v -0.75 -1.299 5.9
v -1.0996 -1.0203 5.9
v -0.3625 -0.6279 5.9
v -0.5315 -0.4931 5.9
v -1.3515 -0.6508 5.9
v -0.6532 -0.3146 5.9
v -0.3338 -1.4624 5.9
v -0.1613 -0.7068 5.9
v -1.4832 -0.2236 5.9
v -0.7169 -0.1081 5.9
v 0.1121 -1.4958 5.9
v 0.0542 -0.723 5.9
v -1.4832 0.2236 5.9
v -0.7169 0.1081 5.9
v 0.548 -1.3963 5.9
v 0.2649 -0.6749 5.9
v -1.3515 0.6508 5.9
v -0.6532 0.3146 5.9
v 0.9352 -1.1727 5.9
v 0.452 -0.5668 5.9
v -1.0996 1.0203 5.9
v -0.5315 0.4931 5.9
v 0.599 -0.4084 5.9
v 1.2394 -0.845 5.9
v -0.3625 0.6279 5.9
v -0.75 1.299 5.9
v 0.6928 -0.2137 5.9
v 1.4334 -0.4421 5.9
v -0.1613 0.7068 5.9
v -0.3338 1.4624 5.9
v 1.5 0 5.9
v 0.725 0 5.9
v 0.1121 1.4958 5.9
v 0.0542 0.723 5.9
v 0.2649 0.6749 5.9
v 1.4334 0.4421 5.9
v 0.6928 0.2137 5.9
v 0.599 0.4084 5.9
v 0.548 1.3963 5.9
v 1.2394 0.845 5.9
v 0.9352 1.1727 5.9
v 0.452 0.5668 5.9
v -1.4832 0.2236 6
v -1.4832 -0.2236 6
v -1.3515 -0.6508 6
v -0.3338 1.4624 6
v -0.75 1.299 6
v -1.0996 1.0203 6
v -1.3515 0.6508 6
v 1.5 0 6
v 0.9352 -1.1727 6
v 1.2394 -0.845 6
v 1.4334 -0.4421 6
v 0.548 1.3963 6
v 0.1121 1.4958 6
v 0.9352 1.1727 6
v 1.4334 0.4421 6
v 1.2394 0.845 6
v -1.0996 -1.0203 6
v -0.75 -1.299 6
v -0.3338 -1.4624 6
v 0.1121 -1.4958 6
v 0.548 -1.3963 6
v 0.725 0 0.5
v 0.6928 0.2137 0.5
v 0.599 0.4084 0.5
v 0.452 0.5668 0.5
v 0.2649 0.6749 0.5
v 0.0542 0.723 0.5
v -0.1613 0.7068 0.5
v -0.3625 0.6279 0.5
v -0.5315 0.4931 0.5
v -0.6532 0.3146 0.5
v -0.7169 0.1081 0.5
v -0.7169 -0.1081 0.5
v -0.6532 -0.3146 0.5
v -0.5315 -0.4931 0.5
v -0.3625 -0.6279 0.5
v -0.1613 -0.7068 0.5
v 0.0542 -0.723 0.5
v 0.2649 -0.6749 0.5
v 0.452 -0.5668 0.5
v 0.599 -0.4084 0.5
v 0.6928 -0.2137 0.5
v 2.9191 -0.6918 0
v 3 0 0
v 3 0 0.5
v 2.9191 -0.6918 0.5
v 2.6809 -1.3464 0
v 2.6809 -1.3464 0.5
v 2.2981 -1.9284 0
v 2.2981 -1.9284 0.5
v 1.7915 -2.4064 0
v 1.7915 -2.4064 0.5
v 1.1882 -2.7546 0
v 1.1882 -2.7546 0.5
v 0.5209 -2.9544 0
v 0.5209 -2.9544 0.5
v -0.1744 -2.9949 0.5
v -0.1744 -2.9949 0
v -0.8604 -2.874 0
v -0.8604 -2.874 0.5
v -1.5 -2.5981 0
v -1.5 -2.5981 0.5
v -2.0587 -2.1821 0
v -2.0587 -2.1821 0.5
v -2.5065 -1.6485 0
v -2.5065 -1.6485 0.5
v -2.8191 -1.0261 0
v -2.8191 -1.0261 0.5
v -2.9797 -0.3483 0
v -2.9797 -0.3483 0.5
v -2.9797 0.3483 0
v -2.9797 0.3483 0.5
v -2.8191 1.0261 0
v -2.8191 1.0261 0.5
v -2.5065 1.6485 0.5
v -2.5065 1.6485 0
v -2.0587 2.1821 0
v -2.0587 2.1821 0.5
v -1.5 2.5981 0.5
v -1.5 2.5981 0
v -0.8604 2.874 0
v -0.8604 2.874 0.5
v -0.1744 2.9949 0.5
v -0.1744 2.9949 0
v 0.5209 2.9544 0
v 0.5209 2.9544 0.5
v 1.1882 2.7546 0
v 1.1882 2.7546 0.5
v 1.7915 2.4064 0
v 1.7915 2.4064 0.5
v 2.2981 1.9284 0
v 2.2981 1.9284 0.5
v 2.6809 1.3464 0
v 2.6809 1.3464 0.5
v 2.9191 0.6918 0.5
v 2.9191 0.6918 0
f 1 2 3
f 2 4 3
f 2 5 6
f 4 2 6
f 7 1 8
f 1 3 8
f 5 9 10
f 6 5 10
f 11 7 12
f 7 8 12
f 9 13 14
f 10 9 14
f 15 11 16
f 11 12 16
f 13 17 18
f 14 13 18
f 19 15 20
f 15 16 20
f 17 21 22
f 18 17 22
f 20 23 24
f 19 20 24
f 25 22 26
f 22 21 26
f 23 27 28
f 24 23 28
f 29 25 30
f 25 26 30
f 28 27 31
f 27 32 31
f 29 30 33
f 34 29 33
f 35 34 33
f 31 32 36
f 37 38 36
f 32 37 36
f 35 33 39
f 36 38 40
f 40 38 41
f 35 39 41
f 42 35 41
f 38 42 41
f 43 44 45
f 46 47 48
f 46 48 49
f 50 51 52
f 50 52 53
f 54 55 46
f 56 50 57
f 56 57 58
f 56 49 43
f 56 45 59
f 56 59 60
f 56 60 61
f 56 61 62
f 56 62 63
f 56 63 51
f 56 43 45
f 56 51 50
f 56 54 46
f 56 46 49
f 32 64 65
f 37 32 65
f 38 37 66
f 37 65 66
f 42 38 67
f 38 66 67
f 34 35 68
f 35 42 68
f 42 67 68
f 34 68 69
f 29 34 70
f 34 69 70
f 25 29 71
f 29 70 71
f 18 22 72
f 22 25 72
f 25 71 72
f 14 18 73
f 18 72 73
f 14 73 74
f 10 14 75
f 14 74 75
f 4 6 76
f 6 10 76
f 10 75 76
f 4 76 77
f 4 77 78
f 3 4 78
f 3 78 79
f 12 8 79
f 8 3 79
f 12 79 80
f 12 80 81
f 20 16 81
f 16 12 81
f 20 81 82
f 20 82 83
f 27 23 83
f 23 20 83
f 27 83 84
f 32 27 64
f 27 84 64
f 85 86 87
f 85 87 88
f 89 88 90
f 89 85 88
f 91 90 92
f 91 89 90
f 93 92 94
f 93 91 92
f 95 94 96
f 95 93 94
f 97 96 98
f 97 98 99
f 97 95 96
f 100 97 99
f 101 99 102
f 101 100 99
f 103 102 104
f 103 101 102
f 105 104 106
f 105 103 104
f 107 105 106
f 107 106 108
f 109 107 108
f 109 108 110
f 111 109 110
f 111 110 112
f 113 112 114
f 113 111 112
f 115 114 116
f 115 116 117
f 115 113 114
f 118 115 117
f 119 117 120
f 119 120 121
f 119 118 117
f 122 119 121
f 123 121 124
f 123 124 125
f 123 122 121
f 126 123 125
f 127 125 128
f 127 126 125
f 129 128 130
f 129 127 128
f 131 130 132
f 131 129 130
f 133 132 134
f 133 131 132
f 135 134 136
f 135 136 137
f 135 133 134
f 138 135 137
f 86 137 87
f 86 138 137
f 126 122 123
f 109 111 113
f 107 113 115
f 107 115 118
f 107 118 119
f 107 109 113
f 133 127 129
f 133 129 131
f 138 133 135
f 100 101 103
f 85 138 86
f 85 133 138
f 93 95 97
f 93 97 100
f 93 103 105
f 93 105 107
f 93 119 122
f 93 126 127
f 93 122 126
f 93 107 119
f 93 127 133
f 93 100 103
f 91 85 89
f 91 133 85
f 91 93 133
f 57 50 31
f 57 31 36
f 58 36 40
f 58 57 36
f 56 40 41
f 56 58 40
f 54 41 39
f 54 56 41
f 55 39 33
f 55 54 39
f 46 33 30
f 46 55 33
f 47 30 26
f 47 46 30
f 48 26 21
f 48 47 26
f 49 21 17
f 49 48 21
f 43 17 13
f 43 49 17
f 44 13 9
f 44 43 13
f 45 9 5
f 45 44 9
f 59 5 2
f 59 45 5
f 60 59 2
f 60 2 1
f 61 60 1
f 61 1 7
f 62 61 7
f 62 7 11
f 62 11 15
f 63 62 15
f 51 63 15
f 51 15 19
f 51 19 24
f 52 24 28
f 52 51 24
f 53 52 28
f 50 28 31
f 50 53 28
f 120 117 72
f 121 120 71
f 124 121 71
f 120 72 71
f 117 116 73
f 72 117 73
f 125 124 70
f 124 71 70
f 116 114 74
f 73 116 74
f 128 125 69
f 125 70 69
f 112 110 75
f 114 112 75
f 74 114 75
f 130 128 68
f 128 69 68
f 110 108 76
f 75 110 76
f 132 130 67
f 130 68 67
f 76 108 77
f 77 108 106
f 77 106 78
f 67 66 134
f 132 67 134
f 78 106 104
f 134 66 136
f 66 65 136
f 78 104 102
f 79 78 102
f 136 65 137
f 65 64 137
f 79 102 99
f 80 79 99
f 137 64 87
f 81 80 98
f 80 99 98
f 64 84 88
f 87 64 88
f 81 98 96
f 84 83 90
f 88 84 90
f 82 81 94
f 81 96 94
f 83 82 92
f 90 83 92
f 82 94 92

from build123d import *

# Parameters (mm, degrees)
F0_R     = 0.725
F1_DEPTH = 6
F2_R     = 1.5
F3_DEPTH = 0.1
F4_R     = 3
F5_DEPTH = 0.5


with BuildPart() as f1:
    # F0 (on Top) → F1 (new body)
    with BuildSketch(Plane.XY):
        Circle(F0_R)
    extrude(amount=F1_DEPTH)

    # F2 (on face) → F3 (join)
    with BuildSketch(Plane.XY.offset(6)):
        Circle(F2_R)
    extrude(amount=-F3_DEPTH)

    # F4 (on face) → F5 (join)
    with BuildSketch(Plane(origin=(0, 0, 0), x_dir=(1, 0, 0), z_dir=(0, 0, -1))):
        Circle(F4_R)
    extrude(amount=-F5_DEPTH)


solid = f1.part
